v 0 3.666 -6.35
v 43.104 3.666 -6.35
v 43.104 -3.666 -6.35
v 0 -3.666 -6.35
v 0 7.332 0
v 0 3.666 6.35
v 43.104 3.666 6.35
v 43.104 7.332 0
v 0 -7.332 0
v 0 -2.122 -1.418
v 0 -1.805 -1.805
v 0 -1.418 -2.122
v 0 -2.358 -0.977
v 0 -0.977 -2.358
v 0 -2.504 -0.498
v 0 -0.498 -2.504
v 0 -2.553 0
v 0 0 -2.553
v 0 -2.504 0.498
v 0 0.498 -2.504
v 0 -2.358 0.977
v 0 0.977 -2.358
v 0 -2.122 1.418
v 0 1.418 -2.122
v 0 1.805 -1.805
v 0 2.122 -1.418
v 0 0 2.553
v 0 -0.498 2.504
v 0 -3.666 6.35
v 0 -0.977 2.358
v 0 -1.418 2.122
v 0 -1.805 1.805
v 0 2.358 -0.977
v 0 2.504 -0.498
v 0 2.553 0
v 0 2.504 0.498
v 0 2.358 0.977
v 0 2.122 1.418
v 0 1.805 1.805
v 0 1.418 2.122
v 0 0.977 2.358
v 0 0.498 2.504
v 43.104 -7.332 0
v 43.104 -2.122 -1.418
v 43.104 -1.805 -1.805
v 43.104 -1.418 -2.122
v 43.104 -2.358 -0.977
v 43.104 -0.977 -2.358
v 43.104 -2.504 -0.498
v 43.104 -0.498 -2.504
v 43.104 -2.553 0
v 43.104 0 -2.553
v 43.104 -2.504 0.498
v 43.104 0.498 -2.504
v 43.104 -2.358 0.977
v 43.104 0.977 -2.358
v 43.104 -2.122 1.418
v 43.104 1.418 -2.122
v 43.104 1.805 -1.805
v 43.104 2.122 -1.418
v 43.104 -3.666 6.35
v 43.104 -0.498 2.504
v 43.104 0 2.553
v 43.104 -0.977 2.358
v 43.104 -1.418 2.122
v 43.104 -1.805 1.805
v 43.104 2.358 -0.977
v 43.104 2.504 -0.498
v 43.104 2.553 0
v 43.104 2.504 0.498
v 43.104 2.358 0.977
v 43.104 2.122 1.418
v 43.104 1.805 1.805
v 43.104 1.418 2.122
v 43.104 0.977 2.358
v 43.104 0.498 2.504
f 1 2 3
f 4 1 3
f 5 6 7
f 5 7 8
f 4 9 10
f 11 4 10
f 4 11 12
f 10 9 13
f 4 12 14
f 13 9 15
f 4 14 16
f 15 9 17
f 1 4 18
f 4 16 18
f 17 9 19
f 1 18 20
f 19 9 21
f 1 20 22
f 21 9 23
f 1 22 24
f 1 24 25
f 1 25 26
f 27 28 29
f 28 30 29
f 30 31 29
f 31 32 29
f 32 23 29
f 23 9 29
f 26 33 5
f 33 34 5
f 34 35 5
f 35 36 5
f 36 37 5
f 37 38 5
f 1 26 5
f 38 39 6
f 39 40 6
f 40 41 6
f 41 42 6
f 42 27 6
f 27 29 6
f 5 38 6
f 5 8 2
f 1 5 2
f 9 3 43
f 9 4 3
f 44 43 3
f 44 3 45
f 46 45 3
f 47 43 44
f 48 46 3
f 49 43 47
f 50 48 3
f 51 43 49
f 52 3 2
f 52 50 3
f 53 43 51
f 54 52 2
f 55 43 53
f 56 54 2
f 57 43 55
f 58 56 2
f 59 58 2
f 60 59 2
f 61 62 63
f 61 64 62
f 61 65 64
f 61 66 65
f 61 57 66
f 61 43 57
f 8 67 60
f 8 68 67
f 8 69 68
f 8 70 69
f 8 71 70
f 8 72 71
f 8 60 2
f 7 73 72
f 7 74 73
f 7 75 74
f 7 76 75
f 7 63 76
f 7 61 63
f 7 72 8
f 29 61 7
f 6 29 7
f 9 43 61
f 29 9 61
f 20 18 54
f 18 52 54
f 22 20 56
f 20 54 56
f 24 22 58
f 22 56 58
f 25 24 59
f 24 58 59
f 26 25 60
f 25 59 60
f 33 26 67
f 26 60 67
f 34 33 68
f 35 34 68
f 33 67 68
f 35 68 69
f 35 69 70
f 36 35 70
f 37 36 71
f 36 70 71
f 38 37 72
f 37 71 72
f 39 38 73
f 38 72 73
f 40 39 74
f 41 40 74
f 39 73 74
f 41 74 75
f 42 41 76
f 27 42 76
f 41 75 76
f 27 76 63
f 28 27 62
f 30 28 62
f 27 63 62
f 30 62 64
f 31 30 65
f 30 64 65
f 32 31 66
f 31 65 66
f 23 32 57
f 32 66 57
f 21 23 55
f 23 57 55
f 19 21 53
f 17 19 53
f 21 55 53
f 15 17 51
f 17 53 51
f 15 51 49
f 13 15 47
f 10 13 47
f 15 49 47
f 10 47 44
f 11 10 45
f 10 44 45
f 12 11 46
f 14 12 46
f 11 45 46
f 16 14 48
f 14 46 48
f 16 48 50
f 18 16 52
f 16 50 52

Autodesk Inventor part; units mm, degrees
ref_plane "YZ Plane" through (0, 0, 0) normal (1, 0, 0) x (0, 1, 0)
ref_plane "XZ Plane" through (0, 0, 0) normal (0, 1, 0) x (-1, 0, 0)
ref_plane "XY Plane" through (0, 0, 0) normal (0, 0, 1) x (1, 0, 0)
sketch "Sketch1" plane through (0, 0, 0) normal (1, 0, 0) x (0, 1, 0)
  line L0 (-3.6662, -6.35) -> (-7.3323, 0)
  line L1 (-7.3323, 0) -> (-3.6662, 6.35)
  line L2 (-3.6662, 6.35) -> (3.6662, 6.35)
  line L3 (3.6662, 6.35) -> (7.3323, 0)
  line L4 (7.3323, 0) -> (3.6662, -6.35)
  line L5 (3.6662, -6.35) -> (-3.6662, -6.35)
  point P0 (0, 0)
  point P1 (0, 0)
  dimension "d0" = 12.7
extrude "Extrusion1" add sketch "Sketch1" along normal blind 43.1038
sketch "Sketch2" plane through (43.1038, 0, 0) normal (1, 0, 0) x (0, 0, -1)
  circle A0 centre (0, 0) radius 2.5527
  dimension "d3" = 5.1054
extrude "Extrusion2" cut sketch "Sketch2" against normal blind 43.1038
properties part number "INDX_015_OuterHex" material "Aluminum 6061"
